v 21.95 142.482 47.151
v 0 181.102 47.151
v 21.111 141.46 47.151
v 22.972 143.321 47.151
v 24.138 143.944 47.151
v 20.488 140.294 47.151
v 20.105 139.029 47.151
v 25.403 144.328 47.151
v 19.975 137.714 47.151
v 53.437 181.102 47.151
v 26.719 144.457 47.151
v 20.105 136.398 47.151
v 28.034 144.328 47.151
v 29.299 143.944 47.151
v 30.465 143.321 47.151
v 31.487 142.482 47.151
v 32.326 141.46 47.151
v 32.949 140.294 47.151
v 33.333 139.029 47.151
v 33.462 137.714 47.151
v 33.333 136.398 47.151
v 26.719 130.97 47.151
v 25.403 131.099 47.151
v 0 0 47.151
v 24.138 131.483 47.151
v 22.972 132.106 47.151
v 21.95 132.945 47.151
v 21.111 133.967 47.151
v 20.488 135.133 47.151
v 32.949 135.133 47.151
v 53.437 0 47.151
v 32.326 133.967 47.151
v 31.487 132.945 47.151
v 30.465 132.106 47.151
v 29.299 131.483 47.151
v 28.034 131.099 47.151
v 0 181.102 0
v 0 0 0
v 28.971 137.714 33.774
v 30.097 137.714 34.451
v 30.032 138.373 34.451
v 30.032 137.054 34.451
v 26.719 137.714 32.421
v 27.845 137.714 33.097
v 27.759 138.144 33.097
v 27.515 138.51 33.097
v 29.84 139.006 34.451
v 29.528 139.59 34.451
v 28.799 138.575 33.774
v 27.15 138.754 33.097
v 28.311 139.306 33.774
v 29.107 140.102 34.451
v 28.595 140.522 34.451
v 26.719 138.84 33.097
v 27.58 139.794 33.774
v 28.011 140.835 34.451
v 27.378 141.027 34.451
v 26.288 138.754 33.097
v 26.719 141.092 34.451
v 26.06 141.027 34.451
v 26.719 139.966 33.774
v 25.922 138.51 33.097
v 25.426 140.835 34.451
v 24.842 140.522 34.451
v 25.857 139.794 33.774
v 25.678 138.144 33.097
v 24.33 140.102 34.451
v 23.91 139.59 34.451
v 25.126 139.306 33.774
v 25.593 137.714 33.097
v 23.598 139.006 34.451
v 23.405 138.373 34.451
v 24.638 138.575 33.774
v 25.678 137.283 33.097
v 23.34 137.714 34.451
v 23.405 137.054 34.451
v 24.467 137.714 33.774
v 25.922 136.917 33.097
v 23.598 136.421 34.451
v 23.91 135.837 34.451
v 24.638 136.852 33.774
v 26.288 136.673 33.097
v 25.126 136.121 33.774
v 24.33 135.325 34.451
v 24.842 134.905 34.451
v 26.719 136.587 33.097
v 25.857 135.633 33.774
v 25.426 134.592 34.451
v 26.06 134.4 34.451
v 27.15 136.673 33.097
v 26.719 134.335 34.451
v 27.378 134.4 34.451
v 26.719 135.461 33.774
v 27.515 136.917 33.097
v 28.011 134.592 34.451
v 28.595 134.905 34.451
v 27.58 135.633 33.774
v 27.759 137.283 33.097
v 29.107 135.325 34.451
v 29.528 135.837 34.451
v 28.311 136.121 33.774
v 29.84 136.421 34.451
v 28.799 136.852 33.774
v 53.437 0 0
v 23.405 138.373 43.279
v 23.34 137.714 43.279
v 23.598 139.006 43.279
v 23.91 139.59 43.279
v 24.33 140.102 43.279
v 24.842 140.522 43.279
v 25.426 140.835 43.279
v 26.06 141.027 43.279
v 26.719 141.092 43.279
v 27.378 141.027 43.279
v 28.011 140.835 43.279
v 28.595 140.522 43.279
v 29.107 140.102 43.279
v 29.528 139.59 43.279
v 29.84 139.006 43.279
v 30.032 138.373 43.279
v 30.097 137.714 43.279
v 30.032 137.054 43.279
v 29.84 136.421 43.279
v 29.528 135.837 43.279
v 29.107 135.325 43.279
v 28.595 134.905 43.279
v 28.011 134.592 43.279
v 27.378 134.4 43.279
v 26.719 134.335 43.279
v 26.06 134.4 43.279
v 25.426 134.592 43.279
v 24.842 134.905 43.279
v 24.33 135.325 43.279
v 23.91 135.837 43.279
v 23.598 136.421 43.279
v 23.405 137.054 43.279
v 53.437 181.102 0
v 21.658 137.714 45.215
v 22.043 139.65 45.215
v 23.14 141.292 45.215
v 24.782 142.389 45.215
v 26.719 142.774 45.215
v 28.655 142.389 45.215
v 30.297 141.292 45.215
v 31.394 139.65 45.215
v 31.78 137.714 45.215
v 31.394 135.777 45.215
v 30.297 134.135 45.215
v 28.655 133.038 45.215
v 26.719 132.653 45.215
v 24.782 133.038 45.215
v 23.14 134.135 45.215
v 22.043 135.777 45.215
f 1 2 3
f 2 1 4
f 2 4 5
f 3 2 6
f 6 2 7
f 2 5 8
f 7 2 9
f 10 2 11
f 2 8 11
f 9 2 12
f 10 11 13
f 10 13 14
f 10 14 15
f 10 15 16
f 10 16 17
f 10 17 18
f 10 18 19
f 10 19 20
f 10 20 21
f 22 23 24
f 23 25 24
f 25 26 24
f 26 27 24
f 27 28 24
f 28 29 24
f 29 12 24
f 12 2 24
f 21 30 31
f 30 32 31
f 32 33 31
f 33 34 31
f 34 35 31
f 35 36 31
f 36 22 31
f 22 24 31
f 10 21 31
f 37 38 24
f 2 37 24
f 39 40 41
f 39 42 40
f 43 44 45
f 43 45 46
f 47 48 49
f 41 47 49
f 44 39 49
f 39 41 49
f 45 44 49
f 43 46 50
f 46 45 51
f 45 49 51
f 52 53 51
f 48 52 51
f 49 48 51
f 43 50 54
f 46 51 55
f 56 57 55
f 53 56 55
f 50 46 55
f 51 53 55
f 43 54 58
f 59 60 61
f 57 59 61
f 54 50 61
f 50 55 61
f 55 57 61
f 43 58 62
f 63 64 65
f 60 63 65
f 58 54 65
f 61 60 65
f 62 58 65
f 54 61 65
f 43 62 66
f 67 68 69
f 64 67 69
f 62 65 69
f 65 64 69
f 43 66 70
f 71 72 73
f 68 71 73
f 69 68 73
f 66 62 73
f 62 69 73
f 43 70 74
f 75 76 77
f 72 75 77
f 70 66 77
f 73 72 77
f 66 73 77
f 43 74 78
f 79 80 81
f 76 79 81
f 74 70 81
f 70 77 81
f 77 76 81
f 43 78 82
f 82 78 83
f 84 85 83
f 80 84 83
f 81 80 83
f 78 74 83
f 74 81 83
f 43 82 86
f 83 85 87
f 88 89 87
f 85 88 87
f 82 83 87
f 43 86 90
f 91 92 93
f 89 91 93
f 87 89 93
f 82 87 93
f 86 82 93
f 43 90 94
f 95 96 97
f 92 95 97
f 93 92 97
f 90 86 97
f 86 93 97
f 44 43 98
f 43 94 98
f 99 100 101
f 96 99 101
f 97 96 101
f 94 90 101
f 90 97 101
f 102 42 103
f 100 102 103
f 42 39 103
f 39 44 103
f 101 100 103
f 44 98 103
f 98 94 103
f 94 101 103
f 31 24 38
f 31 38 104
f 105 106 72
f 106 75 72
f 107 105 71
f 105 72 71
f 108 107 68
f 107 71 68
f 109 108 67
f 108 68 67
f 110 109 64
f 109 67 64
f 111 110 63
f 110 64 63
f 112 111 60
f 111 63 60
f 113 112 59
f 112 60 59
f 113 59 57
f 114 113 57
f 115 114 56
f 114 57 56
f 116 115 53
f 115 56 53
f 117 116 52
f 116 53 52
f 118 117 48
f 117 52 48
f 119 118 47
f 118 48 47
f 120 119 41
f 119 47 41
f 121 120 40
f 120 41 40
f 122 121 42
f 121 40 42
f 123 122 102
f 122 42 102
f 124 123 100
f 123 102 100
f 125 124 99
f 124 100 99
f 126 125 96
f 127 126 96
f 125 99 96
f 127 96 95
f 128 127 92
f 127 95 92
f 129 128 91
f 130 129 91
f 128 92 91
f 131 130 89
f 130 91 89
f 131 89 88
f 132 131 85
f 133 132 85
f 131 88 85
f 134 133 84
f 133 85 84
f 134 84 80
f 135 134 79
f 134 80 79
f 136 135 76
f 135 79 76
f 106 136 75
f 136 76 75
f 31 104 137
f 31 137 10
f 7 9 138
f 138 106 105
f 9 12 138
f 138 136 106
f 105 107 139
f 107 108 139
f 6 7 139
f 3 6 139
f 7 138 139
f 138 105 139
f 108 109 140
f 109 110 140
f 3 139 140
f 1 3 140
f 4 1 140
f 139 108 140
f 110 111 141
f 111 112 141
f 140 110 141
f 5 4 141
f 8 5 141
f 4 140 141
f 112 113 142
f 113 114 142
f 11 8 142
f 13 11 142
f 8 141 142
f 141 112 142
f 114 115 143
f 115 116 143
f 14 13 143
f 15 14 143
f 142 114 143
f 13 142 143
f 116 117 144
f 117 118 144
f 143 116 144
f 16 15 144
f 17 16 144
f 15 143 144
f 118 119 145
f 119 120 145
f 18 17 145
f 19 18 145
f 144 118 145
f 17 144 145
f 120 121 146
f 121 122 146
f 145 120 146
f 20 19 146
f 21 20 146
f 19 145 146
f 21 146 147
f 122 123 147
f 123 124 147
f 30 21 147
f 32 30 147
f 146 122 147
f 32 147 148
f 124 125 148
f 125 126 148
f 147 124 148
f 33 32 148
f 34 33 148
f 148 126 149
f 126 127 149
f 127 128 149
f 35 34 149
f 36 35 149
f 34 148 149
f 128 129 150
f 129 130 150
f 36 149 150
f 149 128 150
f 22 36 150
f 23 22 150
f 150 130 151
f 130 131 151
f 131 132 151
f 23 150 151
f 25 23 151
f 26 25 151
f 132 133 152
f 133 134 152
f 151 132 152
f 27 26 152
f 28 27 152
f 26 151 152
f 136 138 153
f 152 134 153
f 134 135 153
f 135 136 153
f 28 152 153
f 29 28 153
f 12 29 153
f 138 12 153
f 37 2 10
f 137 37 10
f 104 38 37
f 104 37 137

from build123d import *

# Parameters (mm, degrees)
F0_W           = 53.4372702241
F0_H           = 47.1505336463
F1_DEPTH       = 181.102
F3_D           = 6.7564
F3_DEPTH       = 12.7
F3_CSINK_D     = 13.4874
F3_CSINK_ANGLE = 82
F3_TIP         = 2.0298273432


with BuildPart() as f1:
    # F0 (on Front) → F1 (new body)
    with BuildSketch(Plane.XZ):
        with Locations((26.718635112, 23.5752668232)):
            Rectangle(F0_W, F0_H)
    extrude(amount=-F1_DEPTH)

    # F3
    with Locations(Plane.XY.offset(47.1505336463)):
        with Locations((26.718635112, 137.7135068178)):
            CounterSinkHole(F3_D / 2, F3_CSINK_D / 2, depth=F3_DEPTH, counter_sink_angle=F3_CSINK_ANGLE)
            with Locations((0, 0, -(F3_DEPTH + F3_TIP / 2))):  # 118° drill point
                Cone(0, F3_D / 2, F3_TIP, mode=Mode.SUBTRACT)


solid = f1.part
